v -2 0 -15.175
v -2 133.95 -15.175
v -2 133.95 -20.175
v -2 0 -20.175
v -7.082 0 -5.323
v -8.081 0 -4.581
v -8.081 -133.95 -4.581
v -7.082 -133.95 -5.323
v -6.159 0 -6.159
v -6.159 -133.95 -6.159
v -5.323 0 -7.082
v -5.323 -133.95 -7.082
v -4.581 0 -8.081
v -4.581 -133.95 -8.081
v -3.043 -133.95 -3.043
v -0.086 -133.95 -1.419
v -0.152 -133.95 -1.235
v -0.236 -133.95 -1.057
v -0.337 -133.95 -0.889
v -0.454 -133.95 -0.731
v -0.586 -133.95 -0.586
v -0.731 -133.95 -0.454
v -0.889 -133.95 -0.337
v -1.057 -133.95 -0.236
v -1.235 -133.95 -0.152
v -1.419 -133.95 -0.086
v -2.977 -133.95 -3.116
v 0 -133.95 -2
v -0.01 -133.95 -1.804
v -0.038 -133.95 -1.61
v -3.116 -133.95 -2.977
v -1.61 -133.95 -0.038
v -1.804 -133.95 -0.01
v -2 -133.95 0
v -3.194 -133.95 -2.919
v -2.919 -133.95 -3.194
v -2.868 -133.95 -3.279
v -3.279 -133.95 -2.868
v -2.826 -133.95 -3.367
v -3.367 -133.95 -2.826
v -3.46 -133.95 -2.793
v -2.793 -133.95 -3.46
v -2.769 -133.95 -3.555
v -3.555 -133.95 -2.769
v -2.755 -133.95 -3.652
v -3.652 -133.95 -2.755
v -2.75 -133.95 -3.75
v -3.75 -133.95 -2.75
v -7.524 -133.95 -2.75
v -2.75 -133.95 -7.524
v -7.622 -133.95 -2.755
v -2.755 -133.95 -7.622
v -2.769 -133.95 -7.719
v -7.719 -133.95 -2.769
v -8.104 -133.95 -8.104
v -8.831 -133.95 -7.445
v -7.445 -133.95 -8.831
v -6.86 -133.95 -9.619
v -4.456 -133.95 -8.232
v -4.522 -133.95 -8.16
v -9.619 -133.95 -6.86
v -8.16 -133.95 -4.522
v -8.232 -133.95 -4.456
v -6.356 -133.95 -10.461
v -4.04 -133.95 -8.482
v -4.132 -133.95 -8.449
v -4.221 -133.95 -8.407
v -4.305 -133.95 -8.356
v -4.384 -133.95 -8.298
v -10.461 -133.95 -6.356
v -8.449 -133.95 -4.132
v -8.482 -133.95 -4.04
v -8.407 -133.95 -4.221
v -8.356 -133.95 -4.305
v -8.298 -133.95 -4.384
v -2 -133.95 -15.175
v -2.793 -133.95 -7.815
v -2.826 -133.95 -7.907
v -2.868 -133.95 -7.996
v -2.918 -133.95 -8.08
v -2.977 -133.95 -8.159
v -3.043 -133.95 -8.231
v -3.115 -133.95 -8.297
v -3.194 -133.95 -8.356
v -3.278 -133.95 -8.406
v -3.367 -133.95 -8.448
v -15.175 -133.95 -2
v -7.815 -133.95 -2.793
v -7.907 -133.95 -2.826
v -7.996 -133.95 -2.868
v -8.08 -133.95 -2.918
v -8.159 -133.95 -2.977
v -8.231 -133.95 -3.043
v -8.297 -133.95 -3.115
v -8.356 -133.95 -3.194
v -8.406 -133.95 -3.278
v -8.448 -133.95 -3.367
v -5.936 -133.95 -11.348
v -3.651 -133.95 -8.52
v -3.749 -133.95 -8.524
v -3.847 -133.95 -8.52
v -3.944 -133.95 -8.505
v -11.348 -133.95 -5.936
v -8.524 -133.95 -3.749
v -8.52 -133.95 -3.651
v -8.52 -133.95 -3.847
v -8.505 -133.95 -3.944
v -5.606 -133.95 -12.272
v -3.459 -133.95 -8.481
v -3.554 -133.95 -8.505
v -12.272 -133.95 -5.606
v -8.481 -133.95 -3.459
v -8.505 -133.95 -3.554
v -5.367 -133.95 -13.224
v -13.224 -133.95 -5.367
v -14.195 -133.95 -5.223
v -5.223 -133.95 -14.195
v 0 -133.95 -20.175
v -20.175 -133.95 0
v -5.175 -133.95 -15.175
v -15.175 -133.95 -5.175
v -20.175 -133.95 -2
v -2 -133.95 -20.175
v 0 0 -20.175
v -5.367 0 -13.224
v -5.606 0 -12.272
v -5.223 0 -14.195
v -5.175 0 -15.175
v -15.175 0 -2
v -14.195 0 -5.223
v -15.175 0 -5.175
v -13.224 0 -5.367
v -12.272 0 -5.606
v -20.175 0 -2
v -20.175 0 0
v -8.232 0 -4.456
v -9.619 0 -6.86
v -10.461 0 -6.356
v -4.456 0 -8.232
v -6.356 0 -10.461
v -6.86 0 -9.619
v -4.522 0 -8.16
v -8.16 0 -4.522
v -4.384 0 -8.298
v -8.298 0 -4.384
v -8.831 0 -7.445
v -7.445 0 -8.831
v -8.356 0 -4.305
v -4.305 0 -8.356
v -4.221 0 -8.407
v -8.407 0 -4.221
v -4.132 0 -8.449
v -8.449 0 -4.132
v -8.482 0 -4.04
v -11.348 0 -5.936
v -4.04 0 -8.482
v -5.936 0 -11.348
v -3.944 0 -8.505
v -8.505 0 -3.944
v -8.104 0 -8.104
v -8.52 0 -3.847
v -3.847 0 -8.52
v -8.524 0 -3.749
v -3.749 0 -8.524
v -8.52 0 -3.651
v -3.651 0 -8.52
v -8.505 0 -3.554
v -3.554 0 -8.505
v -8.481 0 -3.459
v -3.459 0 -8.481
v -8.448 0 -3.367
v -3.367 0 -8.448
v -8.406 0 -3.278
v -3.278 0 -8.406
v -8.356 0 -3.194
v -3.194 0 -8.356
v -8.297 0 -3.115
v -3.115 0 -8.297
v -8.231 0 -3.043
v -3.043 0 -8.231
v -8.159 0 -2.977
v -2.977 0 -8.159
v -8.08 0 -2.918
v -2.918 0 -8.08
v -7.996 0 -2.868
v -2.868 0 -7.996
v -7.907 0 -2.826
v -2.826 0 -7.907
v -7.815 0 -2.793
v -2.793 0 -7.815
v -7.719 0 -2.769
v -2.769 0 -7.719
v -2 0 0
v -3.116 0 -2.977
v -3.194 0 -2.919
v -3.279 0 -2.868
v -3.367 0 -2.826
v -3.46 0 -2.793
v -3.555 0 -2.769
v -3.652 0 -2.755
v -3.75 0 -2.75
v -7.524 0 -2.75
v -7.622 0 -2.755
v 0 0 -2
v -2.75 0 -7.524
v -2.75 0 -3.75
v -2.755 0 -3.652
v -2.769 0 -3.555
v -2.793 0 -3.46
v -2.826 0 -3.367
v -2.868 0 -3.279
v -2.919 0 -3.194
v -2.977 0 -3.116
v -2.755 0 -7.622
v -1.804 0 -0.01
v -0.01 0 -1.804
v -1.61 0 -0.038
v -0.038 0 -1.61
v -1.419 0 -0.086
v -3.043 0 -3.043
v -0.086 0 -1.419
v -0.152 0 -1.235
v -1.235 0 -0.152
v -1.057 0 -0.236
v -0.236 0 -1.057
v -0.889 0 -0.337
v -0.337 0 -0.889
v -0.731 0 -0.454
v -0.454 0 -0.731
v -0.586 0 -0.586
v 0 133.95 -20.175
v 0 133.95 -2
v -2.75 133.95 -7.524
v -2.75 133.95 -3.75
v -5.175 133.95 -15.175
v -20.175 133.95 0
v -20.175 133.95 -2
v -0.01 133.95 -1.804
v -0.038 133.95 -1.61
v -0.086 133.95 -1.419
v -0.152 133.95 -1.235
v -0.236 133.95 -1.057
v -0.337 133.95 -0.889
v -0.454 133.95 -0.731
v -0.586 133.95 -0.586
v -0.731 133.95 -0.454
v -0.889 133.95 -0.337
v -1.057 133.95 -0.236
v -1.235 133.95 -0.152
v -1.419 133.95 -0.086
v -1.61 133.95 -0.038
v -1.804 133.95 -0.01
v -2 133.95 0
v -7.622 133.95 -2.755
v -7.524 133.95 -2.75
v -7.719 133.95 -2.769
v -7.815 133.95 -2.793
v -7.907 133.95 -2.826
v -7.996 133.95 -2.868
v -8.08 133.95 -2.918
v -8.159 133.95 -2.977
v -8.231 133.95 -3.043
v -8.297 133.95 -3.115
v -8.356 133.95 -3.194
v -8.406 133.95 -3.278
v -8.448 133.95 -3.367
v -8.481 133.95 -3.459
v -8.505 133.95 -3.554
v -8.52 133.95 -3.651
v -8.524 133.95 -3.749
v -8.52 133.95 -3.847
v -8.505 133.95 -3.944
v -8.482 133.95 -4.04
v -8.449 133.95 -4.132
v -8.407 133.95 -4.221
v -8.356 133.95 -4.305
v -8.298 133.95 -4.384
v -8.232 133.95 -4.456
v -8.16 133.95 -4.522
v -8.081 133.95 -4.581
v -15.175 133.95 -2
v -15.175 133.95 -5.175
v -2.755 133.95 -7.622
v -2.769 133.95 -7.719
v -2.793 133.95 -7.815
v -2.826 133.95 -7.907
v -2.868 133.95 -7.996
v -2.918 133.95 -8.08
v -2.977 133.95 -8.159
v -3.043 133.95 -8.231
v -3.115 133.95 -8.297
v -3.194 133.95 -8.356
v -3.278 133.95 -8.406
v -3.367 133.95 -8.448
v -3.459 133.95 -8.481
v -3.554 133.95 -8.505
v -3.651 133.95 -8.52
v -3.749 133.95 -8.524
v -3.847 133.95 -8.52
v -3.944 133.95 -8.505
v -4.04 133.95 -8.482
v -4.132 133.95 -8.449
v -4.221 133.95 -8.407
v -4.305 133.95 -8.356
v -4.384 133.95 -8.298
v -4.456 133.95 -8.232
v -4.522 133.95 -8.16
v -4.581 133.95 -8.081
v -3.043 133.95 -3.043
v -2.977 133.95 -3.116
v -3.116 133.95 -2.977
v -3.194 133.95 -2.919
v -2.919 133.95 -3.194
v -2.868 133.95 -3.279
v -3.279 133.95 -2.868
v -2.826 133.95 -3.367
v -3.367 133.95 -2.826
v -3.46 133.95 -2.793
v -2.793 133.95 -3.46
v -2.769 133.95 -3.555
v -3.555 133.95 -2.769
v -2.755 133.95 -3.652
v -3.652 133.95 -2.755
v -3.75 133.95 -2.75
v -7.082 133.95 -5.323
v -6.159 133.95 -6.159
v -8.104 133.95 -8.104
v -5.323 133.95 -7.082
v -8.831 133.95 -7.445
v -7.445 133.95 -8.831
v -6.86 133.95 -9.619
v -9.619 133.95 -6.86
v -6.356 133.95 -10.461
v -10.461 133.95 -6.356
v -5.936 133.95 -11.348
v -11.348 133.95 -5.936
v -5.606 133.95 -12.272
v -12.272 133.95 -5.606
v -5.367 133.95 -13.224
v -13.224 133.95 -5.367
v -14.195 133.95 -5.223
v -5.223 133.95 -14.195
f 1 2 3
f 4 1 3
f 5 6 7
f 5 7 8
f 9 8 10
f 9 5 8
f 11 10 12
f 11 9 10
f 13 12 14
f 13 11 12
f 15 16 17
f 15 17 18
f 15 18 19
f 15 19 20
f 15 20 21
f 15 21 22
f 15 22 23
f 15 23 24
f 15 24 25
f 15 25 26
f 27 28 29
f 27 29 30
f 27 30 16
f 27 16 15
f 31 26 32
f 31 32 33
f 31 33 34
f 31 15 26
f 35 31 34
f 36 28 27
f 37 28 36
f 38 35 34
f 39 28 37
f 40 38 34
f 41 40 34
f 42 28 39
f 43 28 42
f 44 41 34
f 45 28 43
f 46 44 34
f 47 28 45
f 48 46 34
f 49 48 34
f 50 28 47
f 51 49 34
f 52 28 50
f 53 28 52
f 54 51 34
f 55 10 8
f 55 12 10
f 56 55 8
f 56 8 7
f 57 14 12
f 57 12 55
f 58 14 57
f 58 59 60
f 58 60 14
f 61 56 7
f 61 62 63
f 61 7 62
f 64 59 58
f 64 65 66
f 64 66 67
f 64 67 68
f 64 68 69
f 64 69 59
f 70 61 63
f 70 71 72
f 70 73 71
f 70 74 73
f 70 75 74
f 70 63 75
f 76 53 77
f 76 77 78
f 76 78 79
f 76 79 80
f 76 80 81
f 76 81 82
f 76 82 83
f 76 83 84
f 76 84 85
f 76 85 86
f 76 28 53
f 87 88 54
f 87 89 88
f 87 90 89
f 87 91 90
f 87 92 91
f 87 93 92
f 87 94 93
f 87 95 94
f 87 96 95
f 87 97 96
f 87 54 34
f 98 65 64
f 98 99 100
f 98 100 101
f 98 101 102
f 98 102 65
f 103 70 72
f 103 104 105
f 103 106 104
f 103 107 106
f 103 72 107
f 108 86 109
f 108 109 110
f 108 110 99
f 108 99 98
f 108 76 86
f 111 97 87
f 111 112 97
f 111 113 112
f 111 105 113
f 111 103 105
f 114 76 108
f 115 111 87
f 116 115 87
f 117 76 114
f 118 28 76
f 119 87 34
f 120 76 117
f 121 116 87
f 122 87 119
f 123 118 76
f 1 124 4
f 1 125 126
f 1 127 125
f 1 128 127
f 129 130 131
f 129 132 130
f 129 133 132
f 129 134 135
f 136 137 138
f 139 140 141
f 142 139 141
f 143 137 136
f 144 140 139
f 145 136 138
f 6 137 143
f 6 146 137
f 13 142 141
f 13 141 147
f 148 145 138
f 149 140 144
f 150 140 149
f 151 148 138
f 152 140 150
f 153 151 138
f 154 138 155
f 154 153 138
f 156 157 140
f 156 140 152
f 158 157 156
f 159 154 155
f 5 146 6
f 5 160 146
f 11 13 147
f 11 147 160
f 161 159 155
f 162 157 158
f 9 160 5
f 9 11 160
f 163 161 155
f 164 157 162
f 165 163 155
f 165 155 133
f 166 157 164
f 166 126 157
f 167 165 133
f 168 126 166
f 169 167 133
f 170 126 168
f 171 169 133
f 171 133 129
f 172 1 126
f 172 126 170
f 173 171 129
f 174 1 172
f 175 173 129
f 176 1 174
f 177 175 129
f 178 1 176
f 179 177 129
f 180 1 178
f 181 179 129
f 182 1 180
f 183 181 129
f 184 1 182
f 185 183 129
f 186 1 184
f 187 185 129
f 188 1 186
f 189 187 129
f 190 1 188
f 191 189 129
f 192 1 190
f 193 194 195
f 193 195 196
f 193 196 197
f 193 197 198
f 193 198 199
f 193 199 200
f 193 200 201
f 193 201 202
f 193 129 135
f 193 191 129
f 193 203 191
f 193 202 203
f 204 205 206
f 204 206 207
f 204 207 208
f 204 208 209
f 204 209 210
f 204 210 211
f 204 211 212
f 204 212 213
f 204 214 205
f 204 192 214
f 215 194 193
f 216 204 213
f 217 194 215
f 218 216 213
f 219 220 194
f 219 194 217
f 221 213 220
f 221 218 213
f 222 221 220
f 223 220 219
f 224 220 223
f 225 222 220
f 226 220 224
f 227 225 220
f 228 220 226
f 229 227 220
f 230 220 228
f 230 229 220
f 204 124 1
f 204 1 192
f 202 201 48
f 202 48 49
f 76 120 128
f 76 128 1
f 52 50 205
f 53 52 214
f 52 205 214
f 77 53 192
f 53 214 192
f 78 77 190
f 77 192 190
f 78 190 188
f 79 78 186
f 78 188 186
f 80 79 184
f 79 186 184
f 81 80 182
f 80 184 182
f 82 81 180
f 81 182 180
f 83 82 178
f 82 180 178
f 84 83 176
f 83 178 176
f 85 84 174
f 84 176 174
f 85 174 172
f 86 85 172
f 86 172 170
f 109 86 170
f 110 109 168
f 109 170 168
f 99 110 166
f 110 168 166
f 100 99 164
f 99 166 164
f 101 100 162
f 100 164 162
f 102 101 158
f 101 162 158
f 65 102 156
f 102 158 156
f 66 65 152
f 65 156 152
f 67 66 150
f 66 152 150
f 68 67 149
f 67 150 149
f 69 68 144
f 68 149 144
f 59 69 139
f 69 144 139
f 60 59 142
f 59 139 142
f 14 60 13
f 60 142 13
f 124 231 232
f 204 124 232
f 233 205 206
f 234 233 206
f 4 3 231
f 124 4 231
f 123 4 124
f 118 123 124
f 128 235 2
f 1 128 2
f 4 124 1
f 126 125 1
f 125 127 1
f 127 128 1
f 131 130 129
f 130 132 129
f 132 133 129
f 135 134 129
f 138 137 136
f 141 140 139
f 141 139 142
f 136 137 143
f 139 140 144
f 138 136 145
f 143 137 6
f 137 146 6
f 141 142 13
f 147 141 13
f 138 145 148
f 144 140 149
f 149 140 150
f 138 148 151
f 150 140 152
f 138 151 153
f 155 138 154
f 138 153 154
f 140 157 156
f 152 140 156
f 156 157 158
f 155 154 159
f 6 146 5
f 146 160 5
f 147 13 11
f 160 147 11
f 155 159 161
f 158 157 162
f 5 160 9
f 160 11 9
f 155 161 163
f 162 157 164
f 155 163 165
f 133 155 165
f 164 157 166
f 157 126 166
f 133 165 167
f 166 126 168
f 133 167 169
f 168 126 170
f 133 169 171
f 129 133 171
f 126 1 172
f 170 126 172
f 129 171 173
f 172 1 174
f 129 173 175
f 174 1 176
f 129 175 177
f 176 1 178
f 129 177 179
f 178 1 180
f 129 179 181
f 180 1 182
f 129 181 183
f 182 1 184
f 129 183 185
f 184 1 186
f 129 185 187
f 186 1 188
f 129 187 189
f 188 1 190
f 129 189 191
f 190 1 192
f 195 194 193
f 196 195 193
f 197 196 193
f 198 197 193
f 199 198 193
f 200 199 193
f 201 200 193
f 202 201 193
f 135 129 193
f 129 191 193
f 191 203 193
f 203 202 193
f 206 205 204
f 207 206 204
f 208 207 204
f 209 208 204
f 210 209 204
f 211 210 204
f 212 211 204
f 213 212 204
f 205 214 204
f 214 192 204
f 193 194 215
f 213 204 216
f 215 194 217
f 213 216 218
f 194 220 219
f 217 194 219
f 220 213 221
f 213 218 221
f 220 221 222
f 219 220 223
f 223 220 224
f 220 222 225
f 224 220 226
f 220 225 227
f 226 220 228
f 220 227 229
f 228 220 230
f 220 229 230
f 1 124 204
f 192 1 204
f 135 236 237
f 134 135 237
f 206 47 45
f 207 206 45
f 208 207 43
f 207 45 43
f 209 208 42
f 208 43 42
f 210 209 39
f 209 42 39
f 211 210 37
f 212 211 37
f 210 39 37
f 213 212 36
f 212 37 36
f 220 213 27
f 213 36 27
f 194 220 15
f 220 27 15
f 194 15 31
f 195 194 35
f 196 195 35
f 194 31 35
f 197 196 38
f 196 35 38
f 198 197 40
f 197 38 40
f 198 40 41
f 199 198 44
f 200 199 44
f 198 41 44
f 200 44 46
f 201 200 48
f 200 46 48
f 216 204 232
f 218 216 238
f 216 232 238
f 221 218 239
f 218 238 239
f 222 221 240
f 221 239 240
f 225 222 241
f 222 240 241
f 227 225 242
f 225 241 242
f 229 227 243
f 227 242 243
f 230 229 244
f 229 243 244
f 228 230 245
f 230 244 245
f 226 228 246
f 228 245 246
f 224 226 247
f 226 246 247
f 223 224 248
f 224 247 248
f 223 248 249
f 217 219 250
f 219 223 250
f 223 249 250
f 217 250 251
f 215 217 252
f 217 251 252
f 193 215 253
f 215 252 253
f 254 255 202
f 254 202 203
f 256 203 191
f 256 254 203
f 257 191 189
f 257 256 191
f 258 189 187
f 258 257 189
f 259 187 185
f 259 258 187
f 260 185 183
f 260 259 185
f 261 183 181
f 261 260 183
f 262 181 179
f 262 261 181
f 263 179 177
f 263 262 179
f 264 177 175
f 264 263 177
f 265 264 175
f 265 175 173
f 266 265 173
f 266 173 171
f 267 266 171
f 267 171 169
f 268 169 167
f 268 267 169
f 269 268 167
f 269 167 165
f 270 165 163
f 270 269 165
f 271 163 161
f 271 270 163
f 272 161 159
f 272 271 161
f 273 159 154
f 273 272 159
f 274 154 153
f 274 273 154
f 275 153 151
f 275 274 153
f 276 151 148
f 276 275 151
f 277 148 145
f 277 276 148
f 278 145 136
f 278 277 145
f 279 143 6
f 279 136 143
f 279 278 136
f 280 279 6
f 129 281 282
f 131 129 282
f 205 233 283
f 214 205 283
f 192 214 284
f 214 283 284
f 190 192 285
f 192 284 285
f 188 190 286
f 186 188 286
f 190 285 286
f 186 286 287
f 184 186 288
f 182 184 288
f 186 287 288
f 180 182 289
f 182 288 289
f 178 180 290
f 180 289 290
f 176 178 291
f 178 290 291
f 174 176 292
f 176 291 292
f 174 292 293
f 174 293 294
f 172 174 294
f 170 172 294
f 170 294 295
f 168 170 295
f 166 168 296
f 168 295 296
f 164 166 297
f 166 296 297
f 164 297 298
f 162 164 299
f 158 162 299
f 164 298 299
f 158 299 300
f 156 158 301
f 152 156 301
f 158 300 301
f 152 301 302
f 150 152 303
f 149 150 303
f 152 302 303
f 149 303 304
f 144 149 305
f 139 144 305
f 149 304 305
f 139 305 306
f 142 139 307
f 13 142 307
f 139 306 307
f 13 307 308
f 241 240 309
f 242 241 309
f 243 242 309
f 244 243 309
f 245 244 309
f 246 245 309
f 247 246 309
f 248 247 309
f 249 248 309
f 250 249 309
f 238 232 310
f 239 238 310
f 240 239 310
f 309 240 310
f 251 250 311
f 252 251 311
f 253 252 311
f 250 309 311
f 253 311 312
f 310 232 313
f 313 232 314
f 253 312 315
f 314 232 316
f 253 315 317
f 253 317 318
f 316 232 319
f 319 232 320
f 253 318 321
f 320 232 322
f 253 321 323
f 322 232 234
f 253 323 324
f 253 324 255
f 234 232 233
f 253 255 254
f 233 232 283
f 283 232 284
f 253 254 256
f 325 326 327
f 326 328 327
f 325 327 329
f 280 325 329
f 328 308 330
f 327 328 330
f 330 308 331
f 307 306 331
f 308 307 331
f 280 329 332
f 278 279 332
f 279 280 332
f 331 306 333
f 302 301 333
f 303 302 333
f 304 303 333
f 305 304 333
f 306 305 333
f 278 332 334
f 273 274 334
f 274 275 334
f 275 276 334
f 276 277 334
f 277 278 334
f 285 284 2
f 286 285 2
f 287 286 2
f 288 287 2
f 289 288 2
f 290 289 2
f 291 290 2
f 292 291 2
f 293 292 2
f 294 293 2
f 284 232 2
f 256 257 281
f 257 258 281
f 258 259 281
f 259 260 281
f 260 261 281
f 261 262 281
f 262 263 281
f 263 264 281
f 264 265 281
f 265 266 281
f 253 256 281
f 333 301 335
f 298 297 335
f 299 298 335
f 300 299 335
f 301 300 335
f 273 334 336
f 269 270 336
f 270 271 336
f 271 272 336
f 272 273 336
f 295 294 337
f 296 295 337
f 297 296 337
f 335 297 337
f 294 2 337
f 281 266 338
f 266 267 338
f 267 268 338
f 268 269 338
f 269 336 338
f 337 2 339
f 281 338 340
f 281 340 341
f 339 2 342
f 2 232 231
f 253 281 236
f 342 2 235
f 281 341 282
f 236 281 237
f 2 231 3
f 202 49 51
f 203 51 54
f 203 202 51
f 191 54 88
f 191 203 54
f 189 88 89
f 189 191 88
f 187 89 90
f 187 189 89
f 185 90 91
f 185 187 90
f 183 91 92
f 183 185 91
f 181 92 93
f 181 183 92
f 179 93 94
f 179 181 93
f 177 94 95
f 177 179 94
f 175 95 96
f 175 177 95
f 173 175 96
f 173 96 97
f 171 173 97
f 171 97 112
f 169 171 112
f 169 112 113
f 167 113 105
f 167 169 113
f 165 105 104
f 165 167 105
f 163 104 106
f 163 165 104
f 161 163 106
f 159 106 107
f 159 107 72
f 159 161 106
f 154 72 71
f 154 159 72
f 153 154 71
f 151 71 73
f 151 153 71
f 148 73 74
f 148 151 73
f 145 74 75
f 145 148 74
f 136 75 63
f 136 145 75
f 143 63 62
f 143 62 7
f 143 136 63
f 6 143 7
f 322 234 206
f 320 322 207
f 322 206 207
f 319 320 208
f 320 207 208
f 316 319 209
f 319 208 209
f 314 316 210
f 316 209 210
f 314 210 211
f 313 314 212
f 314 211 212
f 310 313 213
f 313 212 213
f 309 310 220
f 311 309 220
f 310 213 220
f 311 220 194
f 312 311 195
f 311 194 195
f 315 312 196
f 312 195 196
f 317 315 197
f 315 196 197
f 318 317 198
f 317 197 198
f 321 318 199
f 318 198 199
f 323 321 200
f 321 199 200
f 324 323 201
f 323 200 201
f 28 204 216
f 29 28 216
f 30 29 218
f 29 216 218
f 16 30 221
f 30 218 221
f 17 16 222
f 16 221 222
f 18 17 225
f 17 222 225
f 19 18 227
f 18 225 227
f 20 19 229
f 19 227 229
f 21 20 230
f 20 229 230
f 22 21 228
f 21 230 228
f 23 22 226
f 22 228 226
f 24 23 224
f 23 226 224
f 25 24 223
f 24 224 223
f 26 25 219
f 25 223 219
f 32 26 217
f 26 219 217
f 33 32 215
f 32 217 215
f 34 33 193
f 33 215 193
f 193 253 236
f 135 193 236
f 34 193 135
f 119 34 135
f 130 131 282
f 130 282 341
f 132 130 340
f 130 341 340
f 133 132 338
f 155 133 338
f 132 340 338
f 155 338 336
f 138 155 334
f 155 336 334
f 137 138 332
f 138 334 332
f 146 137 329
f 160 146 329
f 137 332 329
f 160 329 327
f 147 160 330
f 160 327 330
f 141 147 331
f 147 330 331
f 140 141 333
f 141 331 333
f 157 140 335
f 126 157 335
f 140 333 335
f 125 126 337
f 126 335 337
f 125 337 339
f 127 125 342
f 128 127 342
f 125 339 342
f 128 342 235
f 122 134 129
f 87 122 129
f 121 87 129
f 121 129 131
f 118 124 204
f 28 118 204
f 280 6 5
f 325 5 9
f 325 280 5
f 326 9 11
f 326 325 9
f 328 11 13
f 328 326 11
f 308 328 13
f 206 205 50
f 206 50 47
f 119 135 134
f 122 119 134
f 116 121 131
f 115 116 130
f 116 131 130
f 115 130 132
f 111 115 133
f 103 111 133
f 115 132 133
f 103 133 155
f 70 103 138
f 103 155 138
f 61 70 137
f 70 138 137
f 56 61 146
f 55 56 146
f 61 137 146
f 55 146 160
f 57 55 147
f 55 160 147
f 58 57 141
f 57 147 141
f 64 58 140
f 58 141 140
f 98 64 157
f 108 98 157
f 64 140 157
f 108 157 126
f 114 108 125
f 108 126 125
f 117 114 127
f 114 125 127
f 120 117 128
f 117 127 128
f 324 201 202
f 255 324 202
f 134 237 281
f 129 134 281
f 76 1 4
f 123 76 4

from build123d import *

# Parameters (mm, degrees)
BOSS_EXTRUDE1_DEPTH = 133.95
SHELL1_T            = -2.75
FILLET1_R           = 1


with BuildPart() as part:
    # Sketch1 → Boss-Extrude1 (new body, symmetric)
    with BuildSketch(Plane(origin=(0, 0, 0), x_dir=(1, 0, 0), z_dir=(0, 1, 0))):
        with BuildLine():
            Line((-5.175, 15.175), (-2, 15.175))
            Line((-2, 15.175), (-2, 20.175))
            Line((-2, 20.175), (0, 20.175))
            Line((0, 20.175), (0, 2))
            ThreePointArc((0, 2), (-0.585786438, 0.585786438), (-2, 0))
            Line((-2, 0), (-20.175, 0))
            Line((-20.175, 0), (-20.175, 2))
            Line((-20.175, 2), (-15.175, 2))
            Line((-15.175, 2), (-15.175, 5.175))
            ThreePointArc((-15.175, 5.175), (-8.103932188, 8.103932188), (-5.175, 15.175))
        make_face()
    extrude(amount=BOSS_EXTRUDE1_DEPTH, both=True)

    # Shell1
    shell1_openings = [part.faces().sort_by_distance(p)[0] for p in [
        (-7.938971863, 133.95, -7.938971863),
        (-7.938971863, -133.95, -7.938971863),
    ]]
    offset(amount=SHELL1_T, openings=shell1_openings)

    # Fillet1
    fillet1_edges = [part.edges().sort_by_distance(p)[0] for p in [
        (-2.75, 0, -2.75),
        (-2.75, 0, -12.3146023),
        (-12.3146023, 0, -2.75),
    ]]
    fillet(fillet1_edges, radius=FILLET1_R)


with BuildPart() as body_2:
    # Split1: the piece on the far side of the plane
    add(part.part)
    split(bisect_by=Plane.ZX, keep=Keep.BOTTOM)


with BuildPart() as part_1:
    add(part.part)

    # Split1
    split(bisect_by=Plane.ZX, keep=Keep.TOP)


solid = Compound([body_2.part, part_1.part])
